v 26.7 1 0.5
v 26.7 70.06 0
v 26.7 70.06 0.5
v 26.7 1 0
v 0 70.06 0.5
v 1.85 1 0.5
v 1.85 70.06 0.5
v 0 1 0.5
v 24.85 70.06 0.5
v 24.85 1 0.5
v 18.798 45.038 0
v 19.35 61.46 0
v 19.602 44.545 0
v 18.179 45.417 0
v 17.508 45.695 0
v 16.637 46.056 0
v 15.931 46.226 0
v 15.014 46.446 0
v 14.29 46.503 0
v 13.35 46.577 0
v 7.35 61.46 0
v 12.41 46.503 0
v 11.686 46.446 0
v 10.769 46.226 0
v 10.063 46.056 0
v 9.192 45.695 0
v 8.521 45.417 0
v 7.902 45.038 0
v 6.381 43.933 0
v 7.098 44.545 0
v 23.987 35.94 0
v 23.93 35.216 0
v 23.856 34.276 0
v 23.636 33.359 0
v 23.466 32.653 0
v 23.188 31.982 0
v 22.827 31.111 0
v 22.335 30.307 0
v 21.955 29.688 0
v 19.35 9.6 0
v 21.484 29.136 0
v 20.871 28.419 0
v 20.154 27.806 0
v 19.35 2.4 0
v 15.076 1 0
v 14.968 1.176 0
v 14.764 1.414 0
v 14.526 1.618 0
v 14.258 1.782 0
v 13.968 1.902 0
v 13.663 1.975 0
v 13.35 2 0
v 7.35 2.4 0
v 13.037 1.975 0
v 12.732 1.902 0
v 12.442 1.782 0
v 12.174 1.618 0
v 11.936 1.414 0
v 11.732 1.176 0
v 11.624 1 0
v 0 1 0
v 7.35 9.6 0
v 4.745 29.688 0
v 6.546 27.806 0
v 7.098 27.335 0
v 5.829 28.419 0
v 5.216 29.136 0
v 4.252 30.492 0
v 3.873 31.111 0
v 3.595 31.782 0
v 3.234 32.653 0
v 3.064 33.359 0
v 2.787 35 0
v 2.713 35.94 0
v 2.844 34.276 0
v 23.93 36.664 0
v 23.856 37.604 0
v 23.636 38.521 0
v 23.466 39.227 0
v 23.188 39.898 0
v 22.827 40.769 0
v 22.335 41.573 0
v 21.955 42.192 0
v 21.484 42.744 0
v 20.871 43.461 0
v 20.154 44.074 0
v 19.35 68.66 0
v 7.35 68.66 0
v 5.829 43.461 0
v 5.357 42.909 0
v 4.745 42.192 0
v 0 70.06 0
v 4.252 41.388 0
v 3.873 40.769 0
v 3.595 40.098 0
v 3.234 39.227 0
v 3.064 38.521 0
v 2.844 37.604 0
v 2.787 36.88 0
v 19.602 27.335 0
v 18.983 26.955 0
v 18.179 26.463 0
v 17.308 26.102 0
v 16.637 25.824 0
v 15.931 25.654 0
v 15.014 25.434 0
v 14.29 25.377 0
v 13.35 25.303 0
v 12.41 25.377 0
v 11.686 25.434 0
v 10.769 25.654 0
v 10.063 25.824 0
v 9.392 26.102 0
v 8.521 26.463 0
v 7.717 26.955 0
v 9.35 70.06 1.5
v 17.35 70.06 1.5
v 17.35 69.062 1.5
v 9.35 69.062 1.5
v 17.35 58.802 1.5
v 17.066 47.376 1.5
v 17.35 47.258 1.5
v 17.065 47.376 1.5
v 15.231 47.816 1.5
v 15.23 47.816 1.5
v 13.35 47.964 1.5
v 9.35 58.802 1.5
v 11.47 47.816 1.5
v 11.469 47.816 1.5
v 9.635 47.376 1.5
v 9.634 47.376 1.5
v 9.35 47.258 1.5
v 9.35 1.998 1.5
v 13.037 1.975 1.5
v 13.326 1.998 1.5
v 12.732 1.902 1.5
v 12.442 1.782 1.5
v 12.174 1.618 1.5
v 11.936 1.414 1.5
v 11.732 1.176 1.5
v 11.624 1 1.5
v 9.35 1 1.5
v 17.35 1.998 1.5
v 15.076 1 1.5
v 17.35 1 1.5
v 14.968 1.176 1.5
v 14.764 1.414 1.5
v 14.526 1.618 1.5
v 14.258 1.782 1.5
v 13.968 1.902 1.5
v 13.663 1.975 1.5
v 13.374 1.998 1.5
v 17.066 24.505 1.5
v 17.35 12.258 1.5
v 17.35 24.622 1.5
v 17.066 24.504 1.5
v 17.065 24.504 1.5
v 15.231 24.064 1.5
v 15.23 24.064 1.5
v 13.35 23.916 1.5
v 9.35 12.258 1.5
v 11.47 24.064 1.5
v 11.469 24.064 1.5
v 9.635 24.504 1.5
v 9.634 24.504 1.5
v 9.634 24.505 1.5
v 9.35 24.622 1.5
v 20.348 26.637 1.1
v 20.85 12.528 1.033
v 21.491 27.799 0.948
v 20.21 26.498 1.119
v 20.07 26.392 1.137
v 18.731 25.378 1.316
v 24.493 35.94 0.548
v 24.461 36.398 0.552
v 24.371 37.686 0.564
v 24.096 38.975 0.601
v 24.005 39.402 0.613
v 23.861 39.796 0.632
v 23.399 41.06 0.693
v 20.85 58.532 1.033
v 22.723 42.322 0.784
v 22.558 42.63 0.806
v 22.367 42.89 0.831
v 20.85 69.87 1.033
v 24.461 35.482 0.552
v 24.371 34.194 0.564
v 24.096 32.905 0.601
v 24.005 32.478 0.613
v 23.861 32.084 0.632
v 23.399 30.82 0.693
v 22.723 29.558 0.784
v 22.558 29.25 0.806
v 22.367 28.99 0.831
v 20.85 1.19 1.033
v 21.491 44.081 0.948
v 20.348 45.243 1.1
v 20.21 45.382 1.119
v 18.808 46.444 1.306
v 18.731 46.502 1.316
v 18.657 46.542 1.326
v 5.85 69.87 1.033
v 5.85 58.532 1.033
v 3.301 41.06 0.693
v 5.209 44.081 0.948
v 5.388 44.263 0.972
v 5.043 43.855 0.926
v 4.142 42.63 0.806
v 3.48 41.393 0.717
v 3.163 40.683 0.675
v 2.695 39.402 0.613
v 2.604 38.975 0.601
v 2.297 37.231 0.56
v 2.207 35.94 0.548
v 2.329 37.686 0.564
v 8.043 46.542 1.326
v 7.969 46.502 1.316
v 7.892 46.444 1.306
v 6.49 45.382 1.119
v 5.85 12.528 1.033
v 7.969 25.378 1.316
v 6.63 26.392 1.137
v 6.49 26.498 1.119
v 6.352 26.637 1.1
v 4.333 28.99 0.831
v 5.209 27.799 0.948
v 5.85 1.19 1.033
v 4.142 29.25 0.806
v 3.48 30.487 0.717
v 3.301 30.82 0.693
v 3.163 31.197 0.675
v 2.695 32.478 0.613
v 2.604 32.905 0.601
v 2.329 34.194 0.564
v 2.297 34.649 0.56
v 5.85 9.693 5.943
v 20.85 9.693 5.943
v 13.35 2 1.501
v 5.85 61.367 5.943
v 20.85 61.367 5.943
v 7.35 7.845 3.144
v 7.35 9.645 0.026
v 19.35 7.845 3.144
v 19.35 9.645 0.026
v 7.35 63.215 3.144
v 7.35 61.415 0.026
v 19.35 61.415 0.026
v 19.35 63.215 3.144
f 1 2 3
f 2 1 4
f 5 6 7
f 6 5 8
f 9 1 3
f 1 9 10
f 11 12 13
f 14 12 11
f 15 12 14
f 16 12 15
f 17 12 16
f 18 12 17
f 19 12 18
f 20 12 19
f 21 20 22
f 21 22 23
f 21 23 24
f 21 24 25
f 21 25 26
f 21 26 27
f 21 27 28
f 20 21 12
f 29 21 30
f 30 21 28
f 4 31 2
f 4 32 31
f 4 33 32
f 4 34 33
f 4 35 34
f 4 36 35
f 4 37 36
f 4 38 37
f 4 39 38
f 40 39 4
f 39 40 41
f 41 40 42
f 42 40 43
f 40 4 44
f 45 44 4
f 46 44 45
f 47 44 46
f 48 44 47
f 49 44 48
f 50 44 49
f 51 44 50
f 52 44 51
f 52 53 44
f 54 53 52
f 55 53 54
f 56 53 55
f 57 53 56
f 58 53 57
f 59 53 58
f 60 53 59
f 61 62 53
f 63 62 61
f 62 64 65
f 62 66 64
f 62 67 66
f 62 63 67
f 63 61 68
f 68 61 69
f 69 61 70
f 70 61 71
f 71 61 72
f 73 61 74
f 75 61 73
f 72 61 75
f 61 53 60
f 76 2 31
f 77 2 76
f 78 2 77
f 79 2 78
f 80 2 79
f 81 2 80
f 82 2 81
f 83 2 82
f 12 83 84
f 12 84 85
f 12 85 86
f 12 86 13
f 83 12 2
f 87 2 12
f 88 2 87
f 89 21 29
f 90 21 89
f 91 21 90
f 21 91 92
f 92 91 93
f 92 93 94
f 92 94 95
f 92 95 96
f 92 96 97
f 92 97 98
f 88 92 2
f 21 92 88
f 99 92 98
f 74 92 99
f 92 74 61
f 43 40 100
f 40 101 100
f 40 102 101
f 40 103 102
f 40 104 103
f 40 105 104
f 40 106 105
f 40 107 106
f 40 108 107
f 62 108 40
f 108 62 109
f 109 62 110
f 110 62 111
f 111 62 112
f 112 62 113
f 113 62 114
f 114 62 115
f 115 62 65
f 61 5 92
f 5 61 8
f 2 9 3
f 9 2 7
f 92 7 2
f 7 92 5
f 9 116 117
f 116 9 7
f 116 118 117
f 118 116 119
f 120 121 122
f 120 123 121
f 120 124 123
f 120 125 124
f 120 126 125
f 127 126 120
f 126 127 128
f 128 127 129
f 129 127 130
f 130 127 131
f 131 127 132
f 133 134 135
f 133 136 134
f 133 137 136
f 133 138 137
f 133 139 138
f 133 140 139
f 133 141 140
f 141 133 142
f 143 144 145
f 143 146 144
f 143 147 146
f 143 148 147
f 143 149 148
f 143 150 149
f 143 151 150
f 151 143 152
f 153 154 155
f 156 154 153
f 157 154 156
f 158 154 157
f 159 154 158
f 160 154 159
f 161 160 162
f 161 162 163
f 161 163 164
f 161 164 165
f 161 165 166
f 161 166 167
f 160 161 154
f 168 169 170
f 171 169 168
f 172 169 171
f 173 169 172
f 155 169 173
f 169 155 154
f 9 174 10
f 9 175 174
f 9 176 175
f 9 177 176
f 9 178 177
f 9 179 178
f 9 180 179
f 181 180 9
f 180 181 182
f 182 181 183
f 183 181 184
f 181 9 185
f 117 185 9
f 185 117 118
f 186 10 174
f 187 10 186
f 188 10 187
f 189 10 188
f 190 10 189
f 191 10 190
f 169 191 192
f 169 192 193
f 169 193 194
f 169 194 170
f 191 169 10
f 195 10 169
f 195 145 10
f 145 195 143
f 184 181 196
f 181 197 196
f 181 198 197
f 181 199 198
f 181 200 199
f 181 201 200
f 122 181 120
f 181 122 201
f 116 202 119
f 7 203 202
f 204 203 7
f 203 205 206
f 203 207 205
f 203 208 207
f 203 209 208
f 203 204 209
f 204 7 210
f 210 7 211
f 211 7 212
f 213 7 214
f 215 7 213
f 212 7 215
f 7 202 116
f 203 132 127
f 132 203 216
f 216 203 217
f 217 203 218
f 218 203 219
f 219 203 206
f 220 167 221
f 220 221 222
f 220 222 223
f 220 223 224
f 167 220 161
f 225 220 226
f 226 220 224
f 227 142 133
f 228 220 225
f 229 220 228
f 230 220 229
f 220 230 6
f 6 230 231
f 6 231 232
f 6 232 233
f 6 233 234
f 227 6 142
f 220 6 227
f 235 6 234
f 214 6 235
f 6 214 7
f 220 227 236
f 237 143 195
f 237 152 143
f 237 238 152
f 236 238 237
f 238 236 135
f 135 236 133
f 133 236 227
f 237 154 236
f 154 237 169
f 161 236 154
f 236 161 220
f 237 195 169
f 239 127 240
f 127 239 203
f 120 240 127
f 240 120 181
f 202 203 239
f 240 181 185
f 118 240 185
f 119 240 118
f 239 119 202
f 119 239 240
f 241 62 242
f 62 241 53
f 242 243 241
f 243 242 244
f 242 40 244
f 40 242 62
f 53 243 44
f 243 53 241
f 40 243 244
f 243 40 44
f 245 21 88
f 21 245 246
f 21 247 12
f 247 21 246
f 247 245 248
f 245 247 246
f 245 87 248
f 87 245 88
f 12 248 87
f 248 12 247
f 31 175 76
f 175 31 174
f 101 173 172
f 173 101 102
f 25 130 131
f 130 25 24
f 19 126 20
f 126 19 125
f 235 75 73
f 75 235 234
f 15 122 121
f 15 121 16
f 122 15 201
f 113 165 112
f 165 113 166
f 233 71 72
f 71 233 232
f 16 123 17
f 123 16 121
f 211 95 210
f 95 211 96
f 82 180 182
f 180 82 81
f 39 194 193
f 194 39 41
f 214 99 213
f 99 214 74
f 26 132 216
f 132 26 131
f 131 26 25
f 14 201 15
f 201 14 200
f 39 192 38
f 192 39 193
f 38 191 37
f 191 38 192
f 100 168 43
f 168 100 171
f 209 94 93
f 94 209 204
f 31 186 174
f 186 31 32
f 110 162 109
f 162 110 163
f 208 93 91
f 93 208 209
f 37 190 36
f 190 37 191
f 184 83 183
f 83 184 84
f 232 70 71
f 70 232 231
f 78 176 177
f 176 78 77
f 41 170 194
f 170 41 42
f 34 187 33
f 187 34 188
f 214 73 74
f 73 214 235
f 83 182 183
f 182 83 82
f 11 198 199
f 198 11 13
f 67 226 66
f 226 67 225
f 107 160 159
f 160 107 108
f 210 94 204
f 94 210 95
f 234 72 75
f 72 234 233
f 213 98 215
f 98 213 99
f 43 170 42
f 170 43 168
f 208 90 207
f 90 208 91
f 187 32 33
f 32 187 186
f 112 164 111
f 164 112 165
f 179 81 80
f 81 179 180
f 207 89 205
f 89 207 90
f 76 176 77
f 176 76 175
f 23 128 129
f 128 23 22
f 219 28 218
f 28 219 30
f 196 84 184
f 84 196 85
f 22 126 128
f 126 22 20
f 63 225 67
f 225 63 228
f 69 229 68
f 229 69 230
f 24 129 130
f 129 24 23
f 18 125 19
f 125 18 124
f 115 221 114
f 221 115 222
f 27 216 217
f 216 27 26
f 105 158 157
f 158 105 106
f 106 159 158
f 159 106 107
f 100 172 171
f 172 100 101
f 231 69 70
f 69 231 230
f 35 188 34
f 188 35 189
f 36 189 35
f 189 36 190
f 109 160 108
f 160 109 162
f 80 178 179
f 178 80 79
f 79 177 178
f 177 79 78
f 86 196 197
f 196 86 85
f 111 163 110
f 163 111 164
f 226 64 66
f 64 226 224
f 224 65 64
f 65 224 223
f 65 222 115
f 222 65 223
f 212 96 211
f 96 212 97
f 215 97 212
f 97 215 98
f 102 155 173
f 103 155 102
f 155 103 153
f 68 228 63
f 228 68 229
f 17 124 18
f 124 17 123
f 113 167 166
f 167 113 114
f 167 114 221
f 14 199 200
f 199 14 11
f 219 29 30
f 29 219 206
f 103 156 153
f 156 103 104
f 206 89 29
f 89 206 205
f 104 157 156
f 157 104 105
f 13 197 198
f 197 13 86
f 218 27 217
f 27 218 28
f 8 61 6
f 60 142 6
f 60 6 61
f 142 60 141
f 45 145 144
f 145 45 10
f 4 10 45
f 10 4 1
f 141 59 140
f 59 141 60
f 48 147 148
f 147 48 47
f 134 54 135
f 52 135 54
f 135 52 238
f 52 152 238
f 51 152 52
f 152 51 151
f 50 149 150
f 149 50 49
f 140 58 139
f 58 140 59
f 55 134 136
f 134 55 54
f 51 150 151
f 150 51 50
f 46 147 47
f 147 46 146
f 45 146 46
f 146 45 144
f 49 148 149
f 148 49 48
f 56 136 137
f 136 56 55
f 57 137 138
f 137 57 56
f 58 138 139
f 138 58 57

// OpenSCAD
$fn=40;

/* Diffuser Lense For A Particular Project (OpenSCAD) */

/* Camera */
cam_dia = 10.5;

/* LED PCB */
ledpcbw = 26.7;
ledpcbh = 71.88;
ledpcb_thickness = 3.47;
ledpcb_header_pos = 25;
ledpcb_header_w = 9;
holedia = (cam_dia + 8);

/* Diffuser */
diffuserw=ledpcbw;
diffuserh=ledpcbh-1.82;
thickness=ledpcb_thickness-1.59;

/* Top Diffuser */
diffuser_top_h=0.5;

/* Bottom Diffuser */
diffuser_bottom_h=1;

/* Enclosure hole */
enclosurew = ledpcb_header_pos-2;

/* SMD LED */
ledh = 2.76-1.59;
ledw = 4;
ledd = 1.6;

/* INSET */
led_mount_inset = 5;
led_mount_angle = 180-60;
led_mount_tol=2;
led_mount_thickness=3;

module led_mount(rotation, w, d, h)
{
  rotate([rotation,0,0])
    union()
    {
      translate([ledpcbw/2 - w/2, -d/2, -h])
        cube([w,d,h+4]);
    }
}


module led_mount_pit(rotation, w, d, h)
{
  translate([0,0,1])
  rotate([rotation+5,0,0])
    union()
    {
      difference()
      {
        translate([ledpcbw/2 - w/2, -d/2, h/2])
          cube([w,d,h+4]);
        translate([ledpcbw/2-1/2, -d/2, -h])
          cube([1,d,h+4]);
      }
    }
}

intersection()
{
difference()
{
  union()
  { 
    // Main object
    difference()
    {
      union()
      { // Main Body
        
        // Top Diffuser
        cube([diffuserw,diffuserh,diffuser_top_h]);
        
        // Bottom Diffuser
        bottom_flat_width = ledw;
        hull()
        {
          translate([(diffuserw - enclosurew)/2,0,0])
            cube([enclosurew,diffuserh,diffuser_top_h]);
          translate([ledpcbw/2 - bottom_flat_width,0,diffuser_top_h])
            cube([bottom_flat_width*2, diffuserh, diffuser_bottom_h]);
        }
        
        // LED Holes
        translate([0,1+led_mount_inset,0])
          led_mount(led_mount_angle,ledw+led_mount_tol*4+led_mount_thickness,ledd+led_mount_tol+led_mount_thickness,ledh+led_mount_thickness+2);
        translate([0,diffuserh-led_mount_inset,0])
          led_mount(-led_mount_angle,ledw+led_mount_tol*4+led_mount_thickness,ledd+led_mount_tol+led_mount_thickness,ledh+led_mount_thickness+2);
      }

      // LED Holes
      translate([0,1+led_mount_inset,0])
        led_mount(led_mount_angle,ledw+led_mount_tol*4,ledd+led_mount_tol,ledh+2);
      translate([0,diffuserh-led_mount_inset,0])
        led_mount(-led_mount_angle,ledw+led_mount_tol*4,ledd+led_mount_tol,ledh+2);

      // Camera Hole
      translate([ledpcbw/2,ledpcbh/2,-thickness/2])
        cylinder(thickness*3,d=holedia);

      // Camera Hole Bottom Lip
      translate([ledpcbw/2,ledpcbh/2, diffuser_top_h+diffuser_bottom_h-3+0.001])
        cylinder(3, d1=holedia, d2=holedia*1.3);
     }
     
     if(0)
     {
     // LED Pit
      translate([0,1+led_mount_inset,0])
        led_mount_pit(led_mount_angle,ledw+led_mount_tol*4,ledd+led_mount_tol,ledh+2);
      translate([0,diffuserh-led_mount_inset,0])
        led_mount_pit(-led_mount_angle,ledw+led_mount_tol*4,ledd+led_mount_tol,ledh+2);
     }
     
  }
  
  /* Trimming */
  translate([0,0,-thickness])
    cube([diffuserw,1,thickness*4]);
  
  /* Remove bottom */
  translate([0,0,-5])
    cube([1000,1000,10], center=true);  
  
  /* Trimming */
  translate([ledpcbw/2,0,-thickness])
    cylinder(r=2,h=100);
}
  cube([diffuserw,diffuserh,1000]);
}
